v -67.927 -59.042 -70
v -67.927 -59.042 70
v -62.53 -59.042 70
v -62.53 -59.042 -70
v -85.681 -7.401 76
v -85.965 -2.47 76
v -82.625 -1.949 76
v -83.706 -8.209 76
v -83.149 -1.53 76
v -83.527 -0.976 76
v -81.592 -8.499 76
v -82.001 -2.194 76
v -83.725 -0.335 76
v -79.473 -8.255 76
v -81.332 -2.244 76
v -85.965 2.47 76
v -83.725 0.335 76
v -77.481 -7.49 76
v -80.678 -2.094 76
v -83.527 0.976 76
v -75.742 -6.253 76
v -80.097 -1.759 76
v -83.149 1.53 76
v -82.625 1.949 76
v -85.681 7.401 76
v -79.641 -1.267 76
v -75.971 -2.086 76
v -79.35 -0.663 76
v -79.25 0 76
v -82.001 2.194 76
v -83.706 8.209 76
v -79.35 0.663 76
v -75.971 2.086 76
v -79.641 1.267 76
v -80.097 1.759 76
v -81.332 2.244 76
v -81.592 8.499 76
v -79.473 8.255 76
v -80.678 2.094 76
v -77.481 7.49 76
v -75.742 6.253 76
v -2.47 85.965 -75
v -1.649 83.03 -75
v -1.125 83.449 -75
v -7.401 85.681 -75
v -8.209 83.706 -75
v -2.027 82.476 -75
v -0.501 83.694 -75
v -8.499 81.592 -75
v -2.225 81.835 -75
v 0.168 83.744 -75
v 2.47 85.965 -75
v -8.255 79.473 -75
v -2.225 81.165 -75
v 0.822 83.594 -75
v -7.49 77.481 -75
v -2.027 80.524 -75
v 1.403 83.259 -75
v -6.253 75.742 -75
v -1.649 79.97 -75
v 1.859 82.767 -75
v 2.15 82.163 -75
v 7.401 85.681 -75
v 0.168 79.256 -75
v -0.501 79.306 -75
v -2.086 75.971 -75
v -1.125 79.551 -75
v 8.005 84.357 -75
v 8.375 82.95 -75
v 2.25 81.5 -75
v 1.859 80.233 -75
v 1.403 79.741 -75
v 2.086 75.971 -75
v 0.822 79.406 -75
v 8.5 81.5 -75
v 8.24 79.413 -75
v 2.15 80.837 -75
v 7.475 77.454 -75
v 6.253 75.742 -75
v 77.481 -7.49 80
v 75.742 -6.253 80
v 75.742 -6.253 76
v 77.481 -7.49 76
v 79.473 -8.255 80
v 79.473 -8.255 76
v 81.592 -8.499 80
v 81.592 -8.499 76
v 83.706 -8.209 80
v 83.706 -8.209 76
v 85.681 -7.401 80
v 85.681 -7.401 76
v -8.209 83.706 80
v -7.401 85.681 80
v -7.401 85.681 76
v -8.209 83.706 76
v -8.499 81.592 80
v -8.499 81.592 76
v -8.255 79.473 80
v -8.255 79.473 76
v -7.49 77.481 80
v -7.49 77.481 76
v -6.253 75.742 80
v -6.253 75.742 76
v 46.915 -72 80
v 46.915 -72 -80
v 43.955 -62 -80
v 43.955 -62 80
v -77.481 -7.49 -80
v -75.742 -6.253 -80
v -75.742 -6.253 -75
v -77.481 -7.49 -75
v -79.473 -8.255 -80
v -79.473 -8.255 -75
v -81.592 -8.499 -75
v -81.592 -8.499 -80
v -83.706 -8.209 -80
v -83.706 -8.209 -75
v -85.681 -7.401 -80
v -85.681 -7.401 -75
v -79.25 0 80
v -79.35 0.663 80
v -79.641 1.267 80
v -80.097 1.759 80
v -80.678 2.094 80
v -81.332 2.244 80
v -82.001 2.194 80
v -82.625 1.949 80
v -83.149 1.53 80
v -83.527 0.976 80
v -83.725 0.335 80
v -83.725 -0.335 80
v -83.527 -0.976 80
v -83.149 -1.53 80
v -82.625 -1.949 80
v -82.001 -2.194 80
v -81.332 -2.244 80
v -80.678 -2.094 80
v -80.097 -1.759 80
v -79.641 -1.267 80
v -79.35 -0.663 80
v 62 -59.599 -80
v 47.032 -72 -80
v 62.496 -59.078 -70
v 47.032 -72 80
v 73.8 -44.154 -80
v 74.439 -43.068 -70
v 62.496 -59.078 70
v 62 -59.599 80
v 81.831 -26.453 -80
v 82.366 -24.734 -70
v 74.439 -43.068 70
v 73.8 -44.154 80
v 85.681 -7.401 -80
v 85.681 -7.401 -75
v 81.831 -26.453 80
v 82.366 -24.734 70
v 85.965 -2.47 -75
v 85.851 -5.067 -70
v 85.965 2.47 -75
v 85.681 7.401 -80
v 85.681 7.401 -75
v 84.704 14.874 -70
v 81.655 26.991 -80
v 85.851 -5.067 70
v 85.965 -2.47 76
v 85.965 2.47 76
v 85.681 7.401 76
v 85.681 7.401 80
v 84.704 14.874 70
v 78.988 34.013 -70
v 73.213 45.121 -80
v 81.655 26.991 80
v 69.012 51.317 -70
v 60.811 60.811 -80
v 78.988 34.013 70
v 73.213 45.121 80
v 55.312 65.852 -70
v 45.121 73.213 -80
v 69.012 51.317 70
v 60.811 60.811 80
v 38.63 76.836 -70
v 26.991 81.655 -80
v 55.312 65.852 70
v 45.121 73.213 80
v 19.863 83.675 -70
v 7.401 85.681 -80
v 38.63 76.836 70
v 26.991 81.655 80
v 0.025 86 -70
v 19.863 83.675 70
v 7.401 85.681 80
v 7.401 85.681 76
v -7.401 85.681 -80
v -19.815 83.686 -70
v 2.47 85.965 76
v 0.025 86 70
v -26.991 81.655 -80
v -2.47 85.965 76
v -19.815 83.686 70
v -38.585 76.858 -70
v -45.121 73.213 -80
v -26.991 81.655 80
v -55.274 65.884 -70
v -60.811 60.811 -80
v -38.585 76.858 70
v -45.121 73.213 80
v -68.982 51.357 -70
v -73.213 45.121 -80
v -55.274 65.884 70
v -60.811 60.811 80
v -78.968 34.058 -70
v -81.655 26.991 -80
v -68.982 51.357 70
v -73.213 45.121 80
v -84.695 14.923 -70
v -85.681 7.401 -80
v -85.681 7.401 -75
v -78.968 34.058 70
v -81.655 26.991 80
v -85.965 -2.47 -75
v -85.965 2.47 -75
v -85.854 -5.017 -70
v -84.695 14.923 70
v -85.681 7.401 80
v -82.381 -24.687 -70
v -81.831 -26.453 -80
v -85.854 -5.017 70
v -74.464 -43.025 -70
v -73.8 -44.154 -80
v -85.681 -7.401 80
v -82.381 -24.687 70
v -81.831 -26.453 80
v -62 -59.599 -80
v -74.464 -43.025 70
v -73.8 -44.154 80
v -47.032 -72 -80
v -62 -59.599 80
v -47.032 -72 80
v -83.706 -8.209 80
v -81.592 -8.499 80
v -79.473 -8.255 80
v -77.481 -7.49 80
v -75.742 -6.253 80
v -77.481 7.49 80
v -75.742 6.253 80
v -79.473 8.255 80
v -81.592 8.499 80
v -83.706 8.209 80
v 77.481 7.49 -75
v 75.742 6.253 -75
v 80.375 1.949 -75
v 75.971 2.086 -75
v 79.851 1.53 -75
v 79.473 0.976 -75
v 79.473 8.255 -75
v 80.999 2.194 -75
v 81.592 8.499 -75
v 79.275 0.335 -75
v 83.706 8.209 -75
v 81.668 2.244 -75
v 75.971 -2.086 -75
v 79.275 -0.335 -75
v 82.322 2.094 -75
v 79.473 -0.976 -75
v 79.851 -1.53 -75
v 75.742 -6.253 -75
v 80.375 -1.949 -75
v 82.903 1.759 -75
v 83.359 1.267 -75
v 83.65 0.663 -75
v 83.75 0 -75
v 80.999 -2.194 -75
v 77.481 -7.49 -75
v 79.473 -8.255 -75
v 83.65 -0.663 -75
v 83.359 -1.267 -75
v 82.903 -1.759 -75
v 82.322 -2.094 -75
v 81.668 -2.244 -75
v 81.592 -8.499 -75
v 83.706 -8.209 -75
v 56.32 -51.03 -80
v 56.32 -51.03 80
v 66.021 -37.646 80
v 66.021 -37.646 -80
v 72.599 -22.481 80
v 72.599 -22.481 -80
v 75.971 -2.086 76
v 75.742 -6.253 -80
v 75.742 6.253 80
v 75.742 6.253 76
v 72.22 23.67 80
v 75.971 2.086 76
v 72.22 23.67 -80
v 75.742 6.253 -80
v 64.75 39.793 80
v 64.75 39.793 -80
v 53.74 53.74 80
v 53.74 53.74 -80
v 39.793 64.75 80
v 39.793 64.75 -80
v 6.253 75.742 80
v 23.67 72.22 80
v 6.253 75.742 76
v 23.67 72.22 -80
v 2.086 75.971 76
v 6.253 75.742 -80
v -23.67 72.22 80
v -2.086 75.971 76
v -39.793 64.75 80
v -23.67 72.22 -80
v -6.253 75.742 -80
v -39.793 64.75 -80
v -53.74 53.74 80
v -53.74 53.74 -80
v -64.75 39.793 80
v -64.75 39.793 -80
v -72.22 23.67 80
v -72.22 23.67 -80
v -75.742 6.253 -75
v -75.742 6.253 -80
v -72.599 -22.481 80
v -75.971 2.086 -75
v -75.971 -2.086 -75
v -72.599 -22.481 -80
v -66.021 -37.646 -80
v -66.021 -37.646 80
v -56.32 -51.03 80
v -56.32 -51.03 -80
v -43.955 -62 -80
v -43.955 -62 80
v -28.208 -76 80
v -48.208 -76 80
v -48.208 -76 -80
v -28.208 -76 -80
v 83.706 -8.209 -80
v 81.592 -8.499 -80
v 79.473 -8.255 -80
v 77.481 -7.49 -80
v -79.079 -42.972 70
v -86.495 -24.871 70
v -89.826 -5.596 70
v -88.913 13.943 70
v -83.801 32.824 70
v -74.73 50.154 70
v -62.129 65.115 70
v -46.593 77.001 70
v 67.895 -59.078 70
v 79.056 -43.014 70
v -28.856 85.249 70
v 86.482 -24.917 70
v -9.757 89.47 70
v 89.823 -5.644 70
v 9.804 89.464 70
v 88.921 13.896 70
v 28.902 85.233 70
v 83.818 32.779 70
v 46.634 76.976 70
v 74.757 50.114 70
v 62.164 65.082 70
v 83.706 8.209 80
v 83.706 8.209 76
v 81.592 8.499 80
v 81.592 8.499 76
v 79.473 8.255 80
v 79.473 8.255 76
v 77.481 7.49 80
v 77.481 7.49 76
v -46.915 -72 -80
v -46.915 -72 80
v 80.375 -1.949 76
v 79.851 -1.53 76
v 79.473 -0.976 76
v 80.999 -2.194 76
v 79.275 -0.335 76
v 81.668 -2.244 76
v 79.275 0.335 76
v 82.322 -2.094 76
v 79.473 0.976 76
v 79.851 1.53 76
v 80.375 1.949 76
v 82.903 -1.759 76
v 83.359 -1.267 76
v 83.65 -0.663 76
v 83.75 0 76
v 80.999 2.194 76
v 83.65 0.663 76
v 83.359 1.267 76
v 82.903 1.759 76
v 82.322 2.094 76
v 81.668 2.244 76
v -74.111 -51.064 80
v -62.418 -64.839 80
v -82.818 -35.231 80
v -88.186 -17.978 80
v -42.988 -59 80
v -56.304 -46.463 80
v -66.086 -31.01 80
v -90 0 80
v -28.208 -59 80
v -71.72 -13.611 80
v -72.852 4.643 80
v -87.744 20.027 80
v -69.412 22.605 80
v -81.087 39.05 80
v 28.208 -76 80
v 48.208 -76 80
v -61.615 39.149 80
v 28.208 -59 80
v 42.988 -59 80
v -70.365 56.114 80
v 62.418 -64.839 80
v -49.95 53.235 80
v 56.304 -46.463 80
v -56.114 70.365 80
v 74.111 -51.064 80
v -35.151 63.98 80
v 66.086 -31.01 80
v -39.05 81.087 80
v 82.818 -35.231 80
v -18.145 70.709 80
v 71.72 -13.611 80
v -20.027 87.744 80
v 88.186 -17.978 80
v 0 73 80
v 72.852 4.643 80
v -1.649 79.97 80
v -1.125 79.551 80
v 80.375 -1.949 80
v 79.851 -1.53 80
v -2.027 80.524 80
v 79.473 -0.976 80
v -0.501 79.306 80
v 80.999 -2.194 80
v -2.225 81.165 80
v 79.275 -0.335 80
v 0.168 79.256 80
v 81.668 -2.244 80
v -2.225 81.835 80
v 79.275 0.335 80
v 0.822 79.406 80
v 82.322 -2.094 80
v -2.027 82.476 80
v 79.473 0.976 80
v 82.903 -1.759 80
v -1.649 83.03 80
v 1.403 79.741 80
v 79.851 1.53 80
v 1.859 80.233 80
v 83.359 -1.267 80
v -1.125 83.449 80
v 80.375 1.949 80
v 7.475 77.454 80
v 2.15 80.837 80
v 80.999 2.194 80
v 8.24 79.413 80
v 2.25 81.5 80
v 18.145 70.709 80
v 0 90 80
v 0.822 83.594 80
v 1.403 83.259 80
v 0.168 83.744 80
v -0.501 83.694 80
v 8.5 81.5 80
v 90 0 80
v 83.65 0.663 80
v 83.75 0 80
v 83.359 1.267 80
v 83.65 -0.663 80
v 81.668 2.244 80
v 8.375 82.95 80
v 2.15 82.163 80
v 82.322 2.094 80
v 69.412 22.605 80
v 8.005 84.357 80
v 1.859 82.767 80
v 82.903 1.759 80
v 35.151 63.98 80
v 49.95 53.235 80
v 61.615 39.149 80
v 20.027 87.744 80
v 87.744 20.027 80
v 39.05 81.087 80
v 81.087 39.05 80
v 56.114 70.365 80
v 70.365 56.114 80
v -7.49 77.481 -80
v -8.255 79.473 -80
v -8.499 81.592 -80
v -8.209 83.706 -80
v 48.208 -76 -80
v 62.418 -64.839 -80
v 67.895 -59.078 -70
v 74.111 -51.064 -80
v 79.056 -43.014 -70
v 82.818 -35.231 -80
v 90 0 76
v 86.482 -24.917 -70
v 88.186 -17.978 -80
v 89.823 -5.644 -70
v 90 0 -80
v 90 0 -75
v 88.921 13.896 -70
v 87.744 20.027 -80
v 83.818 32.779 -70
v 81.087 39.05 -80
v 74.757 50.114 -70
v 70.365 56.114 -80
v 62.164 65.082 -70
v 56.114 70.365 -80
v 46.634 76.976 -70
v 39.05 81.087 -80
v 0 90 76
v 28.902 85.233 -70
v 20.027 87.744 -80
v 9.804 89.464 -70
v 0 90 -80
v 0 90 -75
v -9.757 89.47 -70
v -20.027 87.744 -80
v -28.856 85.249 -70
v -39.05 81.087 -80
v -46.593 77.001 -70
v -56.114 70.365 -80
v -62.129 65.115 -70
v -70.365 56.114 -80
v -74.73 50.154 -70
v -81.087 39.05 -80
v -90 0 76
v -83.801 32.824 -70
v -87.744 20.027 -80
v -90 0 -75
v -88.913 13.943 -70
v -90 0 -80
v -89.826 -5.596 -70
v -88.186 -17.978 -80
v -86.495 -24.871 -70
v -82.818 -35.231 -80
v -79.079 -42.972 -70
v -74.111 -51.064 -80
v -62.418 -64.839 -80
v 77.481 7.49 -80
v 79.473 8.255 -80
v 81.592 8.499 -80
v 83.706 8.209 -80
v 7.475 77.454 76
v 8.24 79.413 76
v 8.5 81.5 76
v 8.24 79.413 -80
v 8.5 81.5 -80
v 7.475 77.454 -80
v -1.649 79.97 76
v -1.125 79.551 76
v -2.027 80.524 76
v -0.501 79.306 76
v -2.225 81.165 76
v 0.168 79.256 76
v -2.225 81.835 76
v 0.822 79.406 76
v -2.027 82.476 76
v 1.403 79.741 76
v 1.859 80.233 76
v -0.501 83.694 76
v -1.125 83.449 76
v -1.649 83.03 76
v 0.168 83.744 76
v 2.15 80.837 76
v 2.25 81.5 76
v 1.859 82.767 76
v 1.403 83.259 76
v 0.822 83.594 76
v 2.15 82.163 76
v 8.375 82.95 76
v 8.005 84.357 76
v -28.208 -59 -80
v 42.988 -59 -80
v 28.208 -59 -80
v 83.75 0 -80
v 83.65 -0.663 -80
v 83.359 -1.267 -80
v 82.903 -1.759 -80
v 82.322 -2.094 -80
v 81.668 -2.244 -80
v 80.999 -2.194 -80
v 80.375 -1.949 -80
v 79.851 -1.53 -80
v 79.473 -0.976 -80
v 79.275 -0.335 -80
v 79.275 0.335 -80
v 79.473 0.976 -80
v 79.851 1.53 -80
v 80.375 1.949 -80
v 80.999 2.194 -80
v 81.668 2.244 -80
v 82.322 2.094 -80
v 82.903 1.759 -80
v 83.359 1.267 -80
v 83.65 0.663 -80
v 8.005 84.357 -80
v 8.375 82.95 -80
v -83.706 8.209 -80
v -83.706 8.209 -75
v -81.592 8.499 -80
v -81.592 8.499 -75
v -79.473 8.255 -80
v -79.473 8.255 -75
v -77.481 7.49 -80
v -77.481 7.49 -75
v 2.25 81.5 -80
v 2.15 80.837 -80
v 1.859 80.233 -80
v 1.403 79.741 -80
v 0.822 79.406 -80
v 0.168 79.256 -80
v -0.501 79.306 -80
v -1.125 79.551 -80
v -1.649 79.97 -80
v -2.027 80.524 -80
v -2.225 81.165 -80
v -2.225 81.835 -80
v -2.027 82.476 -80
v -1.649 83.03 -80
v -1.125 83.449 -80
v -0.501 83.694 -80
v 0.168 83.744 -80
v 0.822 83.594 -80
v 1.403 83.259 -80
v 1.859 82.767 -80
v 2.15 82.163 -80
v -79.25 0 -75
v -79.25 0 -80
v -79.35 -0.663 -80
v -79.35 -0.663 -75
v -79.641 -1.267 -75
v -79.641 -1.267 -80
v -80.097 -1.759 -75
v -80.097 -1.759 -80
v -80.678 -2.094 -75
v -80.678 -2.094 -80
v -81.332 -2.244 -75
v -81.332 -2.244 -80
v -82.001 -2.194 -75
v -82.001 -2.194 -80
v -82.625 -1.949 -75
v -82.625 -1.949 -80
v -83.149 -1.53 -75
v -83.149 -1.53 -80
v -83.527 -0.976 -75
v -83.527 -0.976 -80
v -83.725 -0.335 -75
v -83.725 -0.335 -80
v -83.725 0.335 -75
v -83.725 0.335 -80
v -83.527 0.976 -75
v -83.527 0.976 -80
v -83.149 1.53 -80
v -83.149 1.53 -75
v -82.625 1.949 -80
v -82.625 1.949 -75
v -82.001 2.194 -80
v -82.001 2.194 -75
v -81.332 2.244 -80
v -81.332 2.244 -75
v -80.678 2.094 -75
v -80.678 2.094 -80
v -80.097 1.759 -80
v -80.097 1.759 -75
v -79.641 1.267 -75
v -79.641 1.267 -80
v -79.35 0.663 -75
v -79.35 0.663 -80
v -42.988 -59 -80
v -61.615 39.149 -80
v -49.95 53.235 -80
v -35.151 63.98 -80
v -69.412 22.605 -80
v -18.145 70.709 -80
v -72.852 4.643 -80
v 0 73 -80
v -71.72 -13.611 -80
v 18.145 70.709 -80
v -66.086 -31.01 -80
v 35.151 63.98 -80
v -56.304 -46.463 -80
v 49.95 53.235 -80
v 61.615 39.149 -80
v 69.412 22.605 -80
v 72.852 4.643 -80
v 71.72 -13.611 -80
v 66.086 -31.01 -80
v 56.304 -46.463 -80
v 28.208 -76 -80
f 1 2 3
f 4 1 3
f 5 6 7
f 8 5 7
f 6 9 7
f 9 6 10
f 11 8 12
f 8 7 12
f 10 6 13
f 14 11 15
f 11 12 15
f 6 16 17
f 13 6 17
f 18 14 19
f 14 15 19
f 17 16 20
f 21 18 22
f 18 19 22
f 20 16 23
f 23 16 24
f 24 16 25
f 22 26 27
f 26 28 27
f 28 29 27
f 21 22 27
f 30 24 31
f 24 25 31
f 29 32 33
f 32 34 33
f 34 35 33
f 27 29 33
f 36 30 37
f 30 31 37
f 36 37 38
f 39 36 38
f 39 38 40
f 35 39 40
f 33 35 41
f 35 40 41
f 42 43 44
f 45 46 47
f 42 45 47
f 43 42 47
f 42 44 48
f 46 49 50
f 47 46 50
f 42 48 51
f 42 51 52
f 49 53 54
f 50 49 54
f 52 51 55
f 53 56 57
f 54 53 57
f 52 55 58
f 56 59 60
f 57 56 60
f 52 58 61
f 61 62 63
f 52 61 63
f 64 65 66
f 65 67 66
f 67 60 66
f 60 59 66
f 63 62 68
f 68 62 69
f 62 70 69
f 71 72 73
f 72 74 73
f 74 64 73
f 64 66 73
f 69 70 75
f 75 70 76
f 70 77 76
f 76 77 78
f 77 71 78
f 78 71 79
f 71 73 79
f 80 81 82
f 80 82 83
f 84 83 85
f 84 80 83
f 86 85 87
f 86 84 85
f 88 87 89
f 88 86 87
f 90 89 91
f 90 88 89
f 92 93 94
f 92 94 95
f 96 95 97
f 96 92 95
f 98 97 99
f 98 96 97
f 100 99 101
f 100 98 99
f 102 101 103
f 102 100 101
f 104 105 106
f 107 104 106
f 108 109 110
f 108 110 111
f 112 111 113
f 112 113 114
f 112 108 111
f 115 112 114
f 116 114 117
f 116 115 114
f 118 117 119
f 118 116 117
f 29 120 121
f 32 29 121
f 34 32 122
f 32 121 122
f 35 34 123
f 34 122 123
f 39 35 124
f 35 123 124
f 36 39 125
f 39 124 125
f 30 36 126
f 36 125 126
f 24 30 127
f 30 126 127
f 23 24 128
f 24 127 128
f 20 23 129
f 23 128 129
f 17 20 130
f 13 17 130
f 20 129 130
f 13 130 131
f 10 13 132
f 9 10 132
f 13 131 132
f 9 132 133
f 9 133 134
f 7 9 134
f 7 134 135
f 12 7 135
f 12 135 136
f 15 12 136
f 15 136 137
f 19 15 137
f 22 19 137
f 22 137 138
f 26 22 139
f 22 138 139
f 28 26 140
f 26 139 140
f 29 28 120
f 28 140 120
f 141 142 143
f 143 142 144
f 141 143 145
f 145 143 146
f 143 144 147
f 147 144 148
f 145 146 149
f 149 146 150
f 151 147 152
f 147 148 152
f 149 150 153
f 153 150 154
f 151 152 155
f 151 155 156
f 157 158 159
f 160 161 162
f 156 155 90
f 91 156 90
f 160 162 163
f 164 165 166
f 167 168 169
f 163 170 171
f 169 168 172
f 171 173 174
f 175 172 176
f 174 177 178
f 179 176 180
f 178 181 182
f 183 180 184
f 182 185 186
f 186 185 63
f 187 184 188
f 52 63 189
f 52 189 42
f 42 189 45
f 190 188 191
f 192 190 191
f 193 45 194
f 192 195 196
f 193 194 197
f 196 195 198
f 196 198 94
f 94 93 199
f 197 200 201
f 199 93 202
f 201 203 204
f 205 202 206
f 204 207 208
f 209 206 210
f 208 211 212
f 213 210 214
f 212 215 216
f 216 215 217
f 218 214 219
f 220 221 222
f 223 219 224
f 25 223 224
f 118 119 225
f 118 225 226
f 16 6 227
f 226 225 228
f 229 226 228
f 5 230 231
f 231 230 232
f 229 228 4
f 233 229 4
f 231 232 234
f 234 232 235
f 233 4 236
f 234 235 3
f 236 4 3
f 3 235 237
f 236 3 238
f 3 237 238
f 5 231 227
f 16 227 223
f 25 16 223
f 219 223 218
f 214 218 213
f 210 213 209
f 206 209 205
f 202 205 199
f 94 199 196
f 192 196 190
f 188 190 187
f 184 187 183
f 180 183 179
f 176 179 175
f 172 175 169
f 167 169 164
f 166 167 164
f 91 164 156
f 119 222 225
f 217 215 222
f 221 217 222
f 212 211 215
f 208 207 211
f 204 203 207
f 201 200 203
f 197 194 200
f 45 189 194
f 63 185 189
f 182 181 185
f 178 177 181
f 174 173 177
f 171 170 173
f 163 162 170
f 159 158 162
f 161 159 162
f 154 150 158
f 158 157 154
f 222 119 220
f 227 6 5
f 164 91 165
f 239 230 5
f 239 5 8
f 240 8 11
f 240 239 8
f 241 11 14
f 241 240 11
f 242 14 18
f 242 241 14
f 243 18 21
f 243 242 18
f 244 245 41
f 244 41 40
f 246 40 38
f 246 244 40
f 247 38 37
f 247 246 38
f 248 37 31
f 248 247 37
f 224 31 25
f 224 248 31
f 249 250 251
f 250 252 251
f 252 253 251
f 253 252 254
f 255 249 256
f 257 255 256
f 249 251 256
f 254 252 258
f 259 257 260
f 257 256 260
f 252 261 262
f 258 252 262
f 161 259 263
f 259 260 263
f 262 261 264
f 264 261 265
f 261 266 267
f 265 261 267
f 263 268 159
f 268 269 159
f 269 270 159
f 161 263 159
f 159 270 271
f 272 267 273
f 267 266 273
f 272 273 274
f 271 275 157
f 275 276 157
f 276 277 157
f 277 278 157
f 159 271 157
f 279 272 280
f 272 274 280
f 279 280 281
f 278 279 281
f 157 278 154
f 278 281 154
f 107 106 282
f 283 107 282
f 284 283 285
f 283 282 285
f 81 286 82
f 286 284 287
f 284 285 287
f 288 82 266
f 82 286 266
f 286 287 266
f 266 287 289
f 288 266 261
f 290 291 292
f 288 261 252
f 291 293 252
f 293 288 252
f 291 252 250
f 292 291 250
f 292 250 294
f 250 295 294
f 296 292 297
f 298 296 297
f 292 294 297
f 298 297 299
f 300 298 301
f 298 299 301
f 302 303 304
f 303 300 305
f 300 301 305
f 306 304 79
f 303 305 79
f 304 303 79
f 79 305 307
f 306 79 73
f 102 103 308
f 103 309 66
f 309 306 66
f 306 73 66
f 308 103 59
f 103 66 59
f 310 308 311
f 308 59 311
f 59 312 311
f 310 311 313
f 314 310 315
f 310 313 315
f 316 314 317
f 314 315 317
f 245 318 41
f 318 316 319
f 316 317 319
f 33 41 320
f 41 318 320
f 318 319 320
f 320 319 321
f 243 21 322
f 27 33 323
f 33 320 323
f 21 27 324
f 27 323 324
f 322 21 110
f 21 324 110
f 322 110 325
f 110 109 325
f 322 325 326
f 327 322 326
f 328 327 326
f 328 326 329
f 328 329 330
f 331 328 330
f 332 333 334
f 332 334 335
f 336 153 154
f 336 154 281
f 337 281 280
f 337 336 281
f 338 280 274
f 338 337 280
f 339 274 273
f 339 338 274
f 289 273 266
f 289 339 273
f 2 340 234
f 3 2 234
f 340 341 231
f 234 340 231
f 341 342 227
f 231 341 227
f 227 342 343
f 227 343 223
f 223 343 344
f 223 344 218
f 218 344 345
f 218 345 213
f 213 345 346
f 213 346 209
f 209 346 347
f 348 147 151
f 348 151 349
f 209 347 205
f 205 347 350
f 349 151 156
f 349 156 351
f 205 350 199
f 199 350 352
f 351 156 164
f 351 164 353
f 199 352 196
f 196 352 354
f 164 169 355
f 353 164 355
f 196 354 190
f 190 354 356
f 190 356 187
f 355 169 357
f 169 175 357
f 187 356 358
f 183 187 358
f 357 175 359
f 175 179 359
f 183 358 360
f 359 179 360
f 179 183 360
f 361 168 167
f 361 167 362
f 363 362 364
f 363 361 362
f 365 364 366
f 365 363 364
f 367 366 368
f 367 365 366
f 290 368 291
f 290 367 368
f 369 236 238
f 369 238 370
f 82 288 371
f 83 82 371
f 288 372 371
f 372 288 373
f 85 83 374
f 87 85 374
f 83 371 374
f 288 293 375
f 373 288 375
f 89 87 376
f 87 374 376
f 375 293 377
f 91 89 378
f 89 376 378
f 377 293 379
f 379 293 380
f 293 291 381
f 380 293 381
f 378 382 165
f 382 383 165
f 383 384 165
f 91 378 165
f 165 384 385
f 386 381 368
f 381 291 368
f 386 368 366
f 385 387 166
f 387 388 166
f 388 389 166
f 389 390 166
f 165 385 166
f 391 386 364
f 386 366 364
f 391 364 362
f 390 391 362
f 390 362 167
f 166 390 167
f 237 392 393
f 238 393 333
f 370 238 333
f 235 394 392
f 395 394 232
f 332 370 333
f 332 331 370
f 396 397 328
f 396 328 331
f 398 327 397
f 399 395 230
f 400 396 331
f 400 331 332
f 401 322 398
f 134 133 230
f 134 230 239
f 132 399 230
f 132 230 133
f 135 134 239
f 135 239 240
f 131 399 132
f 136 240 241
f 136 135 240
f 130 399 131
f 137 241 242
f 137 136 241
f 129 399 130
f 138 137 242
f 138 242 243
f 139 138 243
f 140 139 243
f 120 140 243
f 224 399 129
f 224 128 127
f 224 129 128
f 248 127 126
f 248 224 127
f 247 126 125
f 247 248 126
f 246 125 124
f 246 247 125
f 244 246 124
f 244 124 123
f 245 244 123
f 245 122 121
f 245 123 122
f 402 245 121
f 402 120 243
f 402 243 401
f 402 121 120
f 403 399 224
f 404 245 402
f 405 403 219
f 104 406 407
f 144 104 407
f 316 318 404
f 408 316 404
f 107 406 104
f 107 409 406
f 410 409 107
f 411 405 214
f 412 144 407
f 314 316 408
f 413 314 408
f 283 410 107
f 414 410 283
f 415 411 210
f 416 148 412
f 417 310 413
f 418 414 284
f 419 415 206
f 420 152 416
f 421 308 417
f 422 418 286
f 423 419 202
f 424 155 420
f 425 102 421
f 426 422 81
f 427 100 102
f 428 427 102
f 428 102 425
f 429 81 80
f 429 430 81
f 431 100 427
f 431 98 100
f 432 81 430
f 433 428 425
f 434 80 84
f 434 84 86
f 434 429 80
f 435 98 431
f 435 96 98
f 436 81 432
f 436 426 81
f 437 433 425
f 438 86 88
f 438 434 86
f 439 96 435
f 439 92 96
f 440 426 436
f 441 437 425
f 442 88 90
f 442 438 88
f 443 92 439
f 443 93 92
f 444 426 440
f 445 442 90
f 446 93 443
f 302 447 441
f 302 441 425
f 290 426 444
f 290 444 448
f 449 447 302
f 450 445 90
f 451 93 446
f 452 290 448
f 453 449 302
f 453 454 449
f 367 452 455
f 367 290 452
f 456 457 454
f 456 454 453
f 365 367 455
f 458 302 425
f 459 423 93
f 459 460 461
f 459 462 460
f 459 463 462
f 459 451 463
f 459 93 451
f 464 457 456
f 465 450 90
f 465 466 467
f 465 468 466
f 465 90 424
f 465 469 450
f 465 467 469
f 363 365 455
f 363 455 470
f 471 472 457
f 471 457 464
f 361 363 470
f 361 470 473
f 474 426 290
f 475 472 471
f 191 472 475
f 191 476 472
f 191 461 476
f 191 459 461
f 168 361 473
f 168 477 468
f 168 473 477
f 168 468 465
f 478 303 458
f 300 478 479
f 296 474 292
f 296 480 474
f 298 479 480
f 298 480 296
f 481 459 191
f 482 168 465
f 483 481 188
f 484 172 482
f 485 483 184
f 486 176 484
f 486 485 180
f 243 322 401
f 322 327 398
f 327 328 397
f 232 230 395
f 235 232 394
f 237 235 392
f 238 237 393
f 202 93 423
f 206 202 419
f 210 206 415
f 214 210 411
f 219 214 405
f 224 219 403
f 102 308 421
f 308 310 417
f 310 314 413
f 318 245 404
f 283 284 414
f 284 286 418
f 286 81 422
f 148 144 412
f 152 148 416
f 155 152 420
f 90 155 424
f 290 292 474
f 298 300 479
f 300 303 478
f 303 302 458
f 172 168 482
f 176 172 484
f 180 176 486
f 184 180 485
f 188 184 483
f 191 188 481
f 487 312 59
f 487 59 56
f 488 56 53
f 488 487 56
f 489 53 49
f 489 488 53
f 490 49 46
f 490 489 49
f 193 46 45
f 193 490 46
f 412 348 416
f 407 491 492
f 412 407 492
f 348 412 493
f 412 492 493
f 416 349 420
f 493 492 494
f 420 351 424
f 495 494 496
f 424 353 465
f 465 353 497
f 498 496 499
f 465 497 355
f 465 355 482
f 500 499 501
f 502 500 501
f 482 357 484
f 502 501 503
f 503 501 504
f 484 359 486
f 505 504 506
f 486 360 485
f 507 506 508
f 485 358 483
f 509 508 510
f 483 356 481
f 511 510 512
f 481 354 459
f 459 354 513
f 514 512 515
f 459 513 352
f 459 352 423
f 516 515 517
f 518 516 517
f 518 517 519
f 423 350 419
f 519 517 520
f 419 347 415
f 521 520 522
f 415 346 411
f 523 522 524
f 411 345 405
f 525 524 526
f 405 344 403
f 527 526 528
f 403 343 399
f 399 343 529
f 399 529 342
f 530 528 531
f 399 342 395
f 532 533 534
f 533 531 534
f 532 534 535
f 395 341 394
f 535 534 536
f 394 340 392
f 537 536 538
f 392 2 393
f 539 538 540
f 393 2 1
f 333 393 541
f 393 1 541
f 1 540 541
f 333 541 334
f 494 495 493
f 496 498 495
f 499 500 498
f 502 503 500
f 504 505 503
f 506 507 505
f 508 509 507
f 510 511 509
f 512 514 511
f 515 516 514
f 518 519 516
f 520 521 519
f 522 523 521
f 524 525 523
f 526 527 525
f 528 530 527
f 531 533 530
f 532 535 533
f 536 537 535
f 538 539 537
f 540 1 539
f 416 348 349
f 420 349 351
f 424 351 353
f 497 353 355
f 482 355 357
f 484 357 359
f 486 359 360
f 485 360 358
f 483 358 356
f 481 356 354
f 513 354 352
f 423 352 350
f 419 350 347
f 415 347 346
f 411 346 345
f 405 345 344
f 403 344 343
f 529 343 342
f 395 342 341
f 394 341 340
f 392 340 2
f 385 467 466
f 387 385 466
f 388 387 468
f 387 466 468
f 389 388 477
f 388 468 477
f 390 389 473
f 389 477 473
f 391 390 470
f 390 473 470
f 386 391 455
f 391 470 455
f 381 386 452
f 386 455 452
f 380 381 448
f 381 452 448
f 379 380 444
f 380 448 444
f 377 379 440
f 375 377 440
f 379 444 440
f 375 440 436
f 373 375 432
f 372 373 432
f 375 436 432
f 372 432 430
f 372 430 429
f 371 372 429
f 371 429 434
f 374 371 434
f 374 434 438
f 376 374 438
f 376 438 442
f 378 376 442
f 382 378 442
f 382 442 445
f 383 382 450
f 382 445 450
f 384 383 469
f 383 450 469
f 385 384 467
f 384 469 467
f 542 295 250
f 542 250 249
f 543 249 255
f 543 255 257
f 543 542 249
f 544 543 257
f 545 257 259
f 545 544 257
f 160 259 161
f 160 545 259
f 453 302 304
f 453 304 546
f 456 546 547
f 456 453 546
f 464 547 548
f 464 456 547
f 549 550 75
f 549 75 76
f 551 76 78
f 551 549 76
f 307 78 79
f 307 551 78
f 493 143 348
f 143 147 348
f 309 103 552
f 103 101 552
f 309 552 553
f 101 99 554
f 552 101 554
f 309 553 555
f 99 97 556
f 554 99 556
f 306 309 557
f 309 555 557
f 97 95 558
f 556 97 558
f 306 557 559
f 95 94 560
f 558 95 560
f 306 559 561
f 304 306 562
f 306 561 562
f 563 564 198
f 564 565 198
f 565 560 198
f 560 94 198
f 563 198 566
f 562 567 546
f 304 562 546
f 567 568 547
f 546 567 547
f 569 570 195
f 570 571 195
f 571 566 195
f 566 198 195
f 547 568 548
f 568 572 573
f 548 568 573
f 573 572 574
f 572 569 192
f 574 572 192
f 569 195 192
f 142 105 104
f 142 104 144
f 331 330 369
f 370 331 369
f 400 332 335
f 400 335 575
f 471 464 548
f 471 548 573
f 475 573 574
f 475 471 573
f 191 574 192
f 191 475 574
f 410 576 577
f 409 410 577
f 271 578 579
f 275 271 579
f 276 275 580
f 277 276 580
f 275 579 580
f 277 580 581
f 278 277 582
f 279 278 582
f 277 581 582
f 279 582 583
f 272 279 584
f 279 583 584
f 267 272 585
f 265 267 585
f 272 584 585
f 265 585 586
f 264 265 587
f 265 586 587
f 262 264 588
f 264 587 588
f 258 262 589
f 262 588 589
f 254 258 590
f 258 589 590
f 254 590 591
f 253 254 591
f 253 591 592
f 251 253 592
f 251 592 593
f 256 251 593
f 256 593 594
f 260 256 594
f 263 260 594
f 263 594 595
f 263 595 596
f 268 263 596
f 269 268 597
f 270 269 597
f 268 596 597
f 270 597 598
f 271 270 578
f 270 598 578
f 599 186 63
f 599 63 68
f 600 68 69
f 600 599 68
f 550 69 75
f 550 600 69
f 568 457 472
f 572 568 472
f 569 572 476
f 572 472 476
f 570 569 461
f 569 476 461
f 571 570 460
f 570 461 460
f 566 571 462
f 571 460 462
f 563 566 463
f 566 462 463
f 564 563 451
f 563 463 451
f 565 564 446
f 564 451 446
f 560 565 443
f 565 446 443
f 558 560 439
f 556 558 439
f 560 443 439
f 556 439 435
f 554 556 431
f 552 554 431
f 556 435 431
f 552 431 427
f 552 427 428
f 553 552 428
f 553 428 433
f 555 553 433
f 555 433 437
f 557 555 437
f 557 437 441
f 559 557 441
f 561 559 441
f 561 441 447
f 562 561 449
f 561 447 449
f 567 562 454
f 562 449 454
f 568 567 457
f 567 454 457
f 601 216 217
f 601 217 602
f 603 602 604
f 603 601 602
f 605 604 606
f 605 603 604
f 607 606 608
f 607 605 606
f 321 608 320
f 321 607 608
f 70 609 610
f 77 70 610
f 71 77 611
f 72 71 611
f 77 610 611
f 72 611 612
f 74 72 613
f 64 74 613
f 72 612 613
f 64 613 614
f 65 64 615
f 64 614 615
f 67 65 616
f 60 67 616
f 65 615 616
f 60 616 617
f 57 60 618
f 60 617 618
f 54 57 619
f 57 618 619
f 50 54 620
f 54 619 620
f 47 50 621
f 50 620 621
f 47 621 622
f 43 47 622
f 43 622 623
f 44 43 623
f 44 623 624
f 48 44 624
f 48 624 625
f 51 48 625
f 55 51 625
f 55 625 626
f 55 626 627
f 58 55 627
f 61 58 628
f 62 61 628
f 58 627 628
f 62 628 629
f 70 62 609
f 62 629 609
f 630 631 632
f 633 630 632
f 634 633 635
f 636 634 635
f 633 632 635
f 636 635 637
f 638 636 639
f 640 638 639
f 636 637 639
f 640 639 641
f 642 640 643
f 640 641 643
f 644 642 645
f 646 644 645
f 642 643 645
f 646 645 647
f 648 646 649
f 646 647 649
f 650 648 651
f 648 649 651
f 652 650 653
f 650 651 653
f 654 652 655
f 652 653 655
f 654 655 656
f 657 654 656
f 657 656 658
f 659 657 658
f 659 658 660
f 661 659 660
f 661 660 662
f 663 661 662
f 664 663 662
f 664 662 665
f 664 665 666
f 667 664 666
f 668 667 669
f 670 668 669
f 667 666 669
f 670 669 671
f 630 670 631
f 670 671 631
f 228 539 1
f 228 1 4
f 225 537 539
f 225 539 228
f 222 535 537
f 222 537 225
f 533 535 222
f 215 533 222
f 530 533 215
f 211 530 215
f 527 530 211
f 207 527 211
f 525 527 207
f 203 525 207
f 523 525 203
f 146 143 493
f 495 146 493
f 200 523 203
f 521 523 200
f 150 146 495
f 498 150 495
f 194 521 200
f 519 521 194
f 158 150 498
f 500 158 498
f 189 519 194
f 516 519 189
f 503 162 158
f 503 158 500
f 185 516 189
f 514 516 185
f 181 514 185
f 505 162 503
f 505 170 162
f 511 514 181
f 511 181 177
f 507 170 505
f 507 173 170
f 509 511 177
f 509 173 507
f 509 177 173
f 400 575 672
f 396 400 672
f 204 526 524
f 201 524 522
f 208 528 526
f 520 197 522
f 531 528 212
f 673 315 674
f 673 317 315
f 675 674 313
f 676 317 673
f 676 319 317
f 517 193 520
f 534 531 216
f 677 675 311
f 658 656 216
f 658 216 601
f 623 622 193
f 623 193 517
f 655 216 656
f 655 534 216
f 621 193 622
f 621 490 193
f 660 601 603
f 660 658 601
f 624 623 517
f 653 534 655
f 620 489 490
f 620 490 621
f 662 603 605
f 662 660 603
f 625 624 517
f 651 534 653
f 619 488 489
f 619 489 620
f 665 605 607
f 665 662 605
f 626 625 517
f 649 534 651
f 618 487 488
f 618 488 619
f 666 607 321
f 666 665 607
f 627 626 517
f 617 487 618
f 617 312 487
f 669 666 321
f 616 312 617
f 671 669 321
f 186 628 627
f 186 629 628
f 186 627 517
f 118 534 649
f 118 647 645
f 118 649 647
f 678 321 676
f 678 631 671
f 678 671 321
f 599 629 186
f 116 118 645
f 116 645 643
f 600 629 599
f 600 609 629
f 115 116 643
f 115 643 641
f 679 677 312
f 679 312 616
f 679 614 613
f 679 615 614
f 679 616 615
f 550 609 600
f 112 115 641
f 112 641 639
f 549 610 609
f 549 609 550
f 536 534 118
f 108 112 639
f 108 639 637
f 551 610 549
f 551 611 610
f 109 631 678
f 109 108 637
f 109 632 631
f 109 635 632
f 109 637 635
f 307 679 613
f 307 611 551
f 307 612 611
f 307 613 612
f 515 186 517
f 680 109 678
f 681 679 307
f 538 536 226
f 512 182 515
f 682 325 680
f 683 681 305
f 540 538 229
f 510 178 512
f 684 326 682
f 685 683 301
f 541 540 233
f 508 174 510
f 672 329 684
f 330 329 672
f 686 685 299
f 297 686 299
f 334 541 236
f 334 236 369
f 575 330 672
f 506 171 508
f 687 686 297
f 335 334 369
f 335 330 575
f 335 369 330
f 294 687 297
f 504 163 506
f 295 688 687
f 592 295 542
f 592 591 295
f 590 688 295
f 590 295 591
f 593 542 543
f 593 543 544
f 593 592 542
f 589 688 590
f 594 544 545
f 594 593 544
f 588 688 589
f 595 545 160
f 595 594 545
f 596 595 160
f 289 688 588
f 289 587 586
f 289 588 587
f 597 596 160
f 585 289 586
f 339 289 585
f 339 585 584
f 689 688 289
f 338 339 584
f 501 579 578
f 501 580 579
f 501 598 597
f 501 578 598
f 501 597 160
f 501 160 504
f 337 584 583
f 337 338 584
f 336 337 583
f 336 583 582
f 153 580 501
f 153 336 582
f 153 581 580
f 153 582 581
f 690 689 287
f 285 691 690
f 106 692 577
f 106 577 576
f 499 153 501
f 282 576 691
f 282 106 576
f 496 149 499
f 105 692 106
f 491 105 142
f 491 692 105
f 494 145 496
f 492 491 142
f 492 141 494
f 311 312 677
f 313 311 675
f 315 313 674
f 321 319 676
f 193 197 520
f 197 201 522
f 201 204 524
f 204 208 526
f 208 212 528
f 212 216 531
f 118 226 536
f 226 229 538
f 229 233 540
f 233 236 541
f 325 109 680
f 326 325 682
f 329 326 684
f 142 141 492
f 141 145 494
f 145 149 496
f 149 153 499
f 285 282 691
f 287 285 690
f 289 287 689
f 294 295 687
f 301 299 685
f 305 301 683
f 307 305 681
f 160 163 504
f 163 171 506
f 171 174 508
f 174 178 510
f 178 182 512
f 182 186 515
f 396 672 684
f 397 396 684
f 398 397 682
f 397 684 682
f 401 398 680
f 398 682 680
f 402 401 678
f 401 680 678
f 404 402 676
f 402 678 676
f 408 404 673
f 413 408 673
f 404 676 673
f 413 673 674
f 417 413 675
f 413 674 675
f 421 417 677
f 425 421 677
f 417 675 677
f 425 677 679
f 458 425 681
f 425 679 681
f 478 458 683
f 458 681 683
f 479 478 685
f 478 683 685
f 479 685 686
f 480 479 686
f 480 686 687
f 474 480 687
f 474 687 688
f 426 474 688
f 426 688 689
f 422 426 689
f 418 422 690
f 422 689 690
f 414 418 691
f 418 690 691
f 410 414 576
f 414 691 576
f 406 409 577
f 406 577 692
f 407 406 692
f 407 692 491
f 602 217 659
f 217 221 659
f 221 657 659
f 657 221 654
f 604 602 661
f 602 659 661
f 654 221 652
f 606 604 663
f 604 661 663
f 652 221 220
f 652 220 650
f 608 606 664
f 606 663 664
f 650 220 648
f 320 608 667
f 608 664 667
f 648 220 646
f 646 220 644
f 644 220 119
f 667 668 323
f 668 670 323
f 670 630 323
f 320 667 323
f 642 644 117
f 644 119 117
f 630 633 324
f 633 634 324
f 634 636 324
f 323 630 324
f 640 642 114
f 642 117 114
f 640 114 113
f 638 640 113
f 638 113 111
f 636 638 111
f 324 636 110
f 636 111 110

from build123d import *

# Parameters (mm, degrees)
F1_DEPTH  = 160
F3_DEPTH  = 160
F4_W      = 56.4157663456
F4_H      = 160
F5_DEPTH  = 4
F7_DEPTH  = 160
F10_DEPTH = 70
F11_R     = 2.25
F12_DEPTH = 4
F13_R     = 2.25
F14_DEPTH = 5


with BuildPart() as f1:
    # F0 (on Top) → F1 (new body)
    with BuildSketch(Plane.XY):
        with BuildLine():
            Line((-48.2078831728, -76), (48.2078831728, -76))
            ThreePointArc((48.2078831728, -76), (0, 90), (-48.2078831728, -76))
        make_face()
    extrude(amount=F1_DEPTH)

    # F2 (on face) → F3 (cut, through all)
    with BuildSketch(Plane.XY.offset(160)):
        with BuildLine():
            Line((-47.0319040652, -72), (47.0319040652, -72))
            ThreePointArc((47.0319040652, -72), (0, 86), (-47.0319040652, -72))
        make_face()
    extrude(amount=-F3_DEPTH, mode=Mode.SUBTRACT)

    # F4 (on face) → F5 (cut, through all)
    with BuildSketch(Plane.XZ.offset(76)):
        with Locations((0, 80)):
            Rectangle(F4_W, F4_H)
    extrude(amount=-F5_DEPTH, mode=Mode.SUBTRACT)

    # F6 (on Top) → F7 (join)
    with BuildSketch(Plane.XY):
        with BuildLine():
            ThreePointArc((43.9545219517, -62), (0, 76), (-43.9545219517, -62))
            Line((-43.9545219517, -62), (-28.2078831728, -62))
            Line((-28.2078831728, -62), (-28.2078831728, -59))
            Line((-28.2078831728, -59), (-42.9883705204, -59))
            ThreePointArc((-42.9883705204, -59), (0, 73), (42.9883705204, -59))
            Line((42.9883705204, -59), (28.2078831728, -59))
            Line((28.2078831728, -59), (28.2078831728, -62))
            Line((28.2078831728, -62), (43.9545219517, -62))
        make_face()
        Polygon((-28.2078831728, -62), (-43.9545219517, -62), (-46.9199158251, -72.0180869102), (-28.2078831728, -72.0180869102), align=None)
        Polygon((46.9199158251, -72.0180869102), (43.9545219517, -62), (28.2078831728, -62), (28.2078831728, -72.0180869102), align=None)
    extrude(amount=F7_DEPTH)


with BuildPart() as f1_1:
    # F8: moved
    add(f1.part.moved(Location((0, 0, -80))))

    # F9 (on Top) → F10 (cut, symmetric)
    with BuildSketch(Plane.XY):
        with BuildLine():
            Line((62.496284582, -59.0780366418), (67.8954018071, -59.0780366418))
            ThreePointArc((67.8954018071, -59.0780366418), (0.0239748666, 89.9999968067), (-67.9268674599, -59.0418552984))
            Line((-67.9268674599, -59.0418552984), (-62.5304671574, -59.0418552984))
            ThreePointArc((-62.5304671574, -59.0418552984), (0.0248874369, 85.9999963989), (62.496284582, -59.0780366418))
        make_face()
    extrude(amount=F10_DEPTH, both=True, mode=Mode.SUBTRACT)

    # F11 (on face) → F12 (join)
    with BuildSketch(Plane.XY.offset(80)):
        with BuildLine():
            ThreePointArc((-75.7423312883, 6.2529393893), (-80.5249171029, 8.4438861518), (-85.6809815951, 7.4006346283))
            ThreePointArc((-85.6809815951, 7.4006346283), (-86, 0), (-85.6809815951, -7.4006346283))
            ThreePointArc((-85.6809815951, -7.4006346283), (-80.5249171029, -8.4438861518), (-75.7423312883, -6.2529393893))
            ThreePointArc((-75.7423312883, -6.2529393893), (-76, 0), (-75.7423312883, 6.2529393893))
        make_face()
        with Locations((-81.5, 0)):
            Circle(F11_R, mode=Mode.SUBTRACT)
        with BuildLine():
            ThreePointArc((6.2529393893, 75.7423312883), (7.9183326783, 78.409691343), (8.5, 81.5))
            ThreePointArc((8.5, 81.5), (8.2205655019, 83.6615510241), (7.4006346283, 85.6809815951))
            ThreePointArc((7.4006346283, 85.6809815951), (0, 86), (-7.4006346283, 85.6809815951))
            ThreePointArc((-7.4006346283, 85.6809815951), (-8.4438861518, 80.5249171029), (-6.2529393893, 75.7423312883))
            ThreePointArc((-6.2529393893, 75.7423312883), (0, 76), (6.2529393893, 75.7423312883))
        make_face()
        with Locations((0, 81.5)):
            Circle(F11_R, mode=Mode.SUBTRACT)
        with BuildLine():
            ThreePointArc((85.6809815951, -7.4006346283), (86, 0), (85.6809815951, 7.4006346283))
            ThreePointArc((85.6809815951, 7.4006346283), (80.5249171029, 8.4438861518), (75.7423312883, 6.2529393893))
            ThreePointArc((75.7423312883, 6.2529393893), (76, 0), (75.7423312883, -6.2529393893))
            ThreePointArc((75.7423312883, -6.2529393893), (80.5249171029, -8.4438861518), (85.6809815951, -7.4006346283))
        make_face()
        with Locations((81.5, 0)):
            Circle(F11_R, mode=Mode.SUBTRACT)
        with BuildLine():
            ThreePointArc((90, 0), (88.8412649986, 4.2843702245), (85.6809815951, 7.4006346283))
            ThreePointArc((85.6809815951, 7.4006346283), (86, 0), (85.6809815951, -7.4006346283))
            ThreePointArc((85.6809815951, -7.4006346283), (88.8412649986, -4.2843702245), (90, 0))
        make_face()
        with BuildLine():
            ThreePointArc((-7.4006346283, 85.6809815951), (0, 86), (7.4006346283, 85.6809815951))
            ThreePointArc((7.4006346283, 85.6809815951), (4.2843702226, 88.8412649997), (-4.4e-09, 90))
            ThreePointArc((-4.4e-09, 90), (-4.2843702264, 88.8412649975), (-7.4006346283, 85.6809815951))
        make_face()
        with BuildLine():
            ThreePointArc((-85.6809815951, 7.4006346283), (-88.8412649971, 4.284370227), (-90, 5.8e-09))
            ThreePointArc((-90, 5.8e-09), (-88.841265, -4.284370222), (-85.6809815951, -7.4006346283))
            ThreePointArc((-85.6809815951, -7.4006346283), (-86, 0), (-85.6809815951, 7.4006346283))
        make_face()
    extrude(amount=-F12_DEPTH)

    # F13 (on face) → F14 (join)
    with BuildSketch(Plane(origin=(0, 0, -80), x_dir=(1, 0, 0), z_dir=(0, 0, -1))):
        with BuildLine():
            ThreePointArc((-75.7423312883, -6.2529393893), (-76, 0), (-75.7423312883, 6.2529393893))
            ThreePointArc((-75.7423312883, 6.2529393893), (-80.5249171029, 8.4438861518), (-85.6809815951, 7.4006346283))
            ThreePointArc((-85.6809815951, 7.4006346283), (-86, 0), (-85.6809815951, -7.4006346283))
            ThreePointArc((-85.6809815951, -7.4006346283), (-80.5249171029, -8.4438861518), (-75.7423312883, -6.2529393893))
        make_face()
        with Locations((-81.5, 0)):
            Circle(F13_R, mode=Mode.SUBTRACT)
        with BuildLine():
            ThreePointArc((-85.6809815951, -7.4006346283), (-86, 0), (-85.6809815951, 7.4006346283))
            ThreePointArc((-85.6809815951, 7.4006346283), (-88.8412649692, 4.2843702749), (-90, 1.165e-07))
            ThreePointArc((-90, 1.165e-07), (-88.8412650279, -4.2843701742), (-85.6809815951, -7.4006346283))
        make_face()
        with BuildLine():
            ThreePointArc((85.6809815951, 7.4006346283), (86, 0), (85.6809815951, -7.4006346283))
            ThreePointArc((85.6809815951, -7.4006346283), (88.8412649986, -4.2843702245), (90, 0))
            ThreePointArc((90, 0), (88.8412649986, 4.2843702245), (85.6809815951, 7.4006346283))
        make_face()
        with BuildLine():
            ThreePointArc((75.7423312883, 6.2529393893), (76, 0), (75.7423312883, -6.2529393893))
            ThreePointArc((75.7423312883, -6.2529393893), (80.5249171029, -8.4438861518), (85.6809815951, -7.4006346283))
            ThreePointArc((85.6809815951, -7.4006346283), (86, 0), (85.6809815951, 7.4006346283))
            ThreePointArc((85.6809815951, 7.4006346283), (80.5249171029, 8.4438861518), (75.7423312883, 6.2529393893))
        make_face()
        with Locations((81.5, 0)):
            Circle(F13_R, mode=Mode.SUBTRACT)
        with BuildLine():
            ThreePointArc((6.2529393893, -75.7423312883), (0, -76), (-6.2529393893, -75.7423312883))
            ThreePointArc((-6.2529393893, -75.7423312883), (-8.4438861518, -80.5249171029), (-7.4006346283, -85.6809815951))
            ThreePointArc((-7.4006346283, -85.6809815951), (0, -86), (7.4006346283, -85.6809815951))
            ThreePointArc((7.4006346283, -85.6809815951), (8.2205655019, -83.6615510241), (8.5, -81.5))
            ThreePointArc((8.5, -81.5), (7.9183326783, -78.409691343), (6.2529393893, -75.7423312883))
        make_face()
        with Locations((0, -81.5)):
            Circle(F13_R, mode=Mode.SUBTRACT)
        with BuildLine():
            ThreePointArc((7.4006346283, -85.6809815951), (0, -86), (-7.4006346283, -85.6809815951))
            ThreePointArc((-7.4006346283, -85.6809815951), (-4.2843702239, -88.8412649989), (1.4e-09, -90))
            ThreePointArc((1.4e-09, -90), (4.2843702252, -88.8412649982), (7.4006346283, -85.6809815951))
        make_face()
    extrude(amount=-F14_DEPTH)


solid = f1_1.part
